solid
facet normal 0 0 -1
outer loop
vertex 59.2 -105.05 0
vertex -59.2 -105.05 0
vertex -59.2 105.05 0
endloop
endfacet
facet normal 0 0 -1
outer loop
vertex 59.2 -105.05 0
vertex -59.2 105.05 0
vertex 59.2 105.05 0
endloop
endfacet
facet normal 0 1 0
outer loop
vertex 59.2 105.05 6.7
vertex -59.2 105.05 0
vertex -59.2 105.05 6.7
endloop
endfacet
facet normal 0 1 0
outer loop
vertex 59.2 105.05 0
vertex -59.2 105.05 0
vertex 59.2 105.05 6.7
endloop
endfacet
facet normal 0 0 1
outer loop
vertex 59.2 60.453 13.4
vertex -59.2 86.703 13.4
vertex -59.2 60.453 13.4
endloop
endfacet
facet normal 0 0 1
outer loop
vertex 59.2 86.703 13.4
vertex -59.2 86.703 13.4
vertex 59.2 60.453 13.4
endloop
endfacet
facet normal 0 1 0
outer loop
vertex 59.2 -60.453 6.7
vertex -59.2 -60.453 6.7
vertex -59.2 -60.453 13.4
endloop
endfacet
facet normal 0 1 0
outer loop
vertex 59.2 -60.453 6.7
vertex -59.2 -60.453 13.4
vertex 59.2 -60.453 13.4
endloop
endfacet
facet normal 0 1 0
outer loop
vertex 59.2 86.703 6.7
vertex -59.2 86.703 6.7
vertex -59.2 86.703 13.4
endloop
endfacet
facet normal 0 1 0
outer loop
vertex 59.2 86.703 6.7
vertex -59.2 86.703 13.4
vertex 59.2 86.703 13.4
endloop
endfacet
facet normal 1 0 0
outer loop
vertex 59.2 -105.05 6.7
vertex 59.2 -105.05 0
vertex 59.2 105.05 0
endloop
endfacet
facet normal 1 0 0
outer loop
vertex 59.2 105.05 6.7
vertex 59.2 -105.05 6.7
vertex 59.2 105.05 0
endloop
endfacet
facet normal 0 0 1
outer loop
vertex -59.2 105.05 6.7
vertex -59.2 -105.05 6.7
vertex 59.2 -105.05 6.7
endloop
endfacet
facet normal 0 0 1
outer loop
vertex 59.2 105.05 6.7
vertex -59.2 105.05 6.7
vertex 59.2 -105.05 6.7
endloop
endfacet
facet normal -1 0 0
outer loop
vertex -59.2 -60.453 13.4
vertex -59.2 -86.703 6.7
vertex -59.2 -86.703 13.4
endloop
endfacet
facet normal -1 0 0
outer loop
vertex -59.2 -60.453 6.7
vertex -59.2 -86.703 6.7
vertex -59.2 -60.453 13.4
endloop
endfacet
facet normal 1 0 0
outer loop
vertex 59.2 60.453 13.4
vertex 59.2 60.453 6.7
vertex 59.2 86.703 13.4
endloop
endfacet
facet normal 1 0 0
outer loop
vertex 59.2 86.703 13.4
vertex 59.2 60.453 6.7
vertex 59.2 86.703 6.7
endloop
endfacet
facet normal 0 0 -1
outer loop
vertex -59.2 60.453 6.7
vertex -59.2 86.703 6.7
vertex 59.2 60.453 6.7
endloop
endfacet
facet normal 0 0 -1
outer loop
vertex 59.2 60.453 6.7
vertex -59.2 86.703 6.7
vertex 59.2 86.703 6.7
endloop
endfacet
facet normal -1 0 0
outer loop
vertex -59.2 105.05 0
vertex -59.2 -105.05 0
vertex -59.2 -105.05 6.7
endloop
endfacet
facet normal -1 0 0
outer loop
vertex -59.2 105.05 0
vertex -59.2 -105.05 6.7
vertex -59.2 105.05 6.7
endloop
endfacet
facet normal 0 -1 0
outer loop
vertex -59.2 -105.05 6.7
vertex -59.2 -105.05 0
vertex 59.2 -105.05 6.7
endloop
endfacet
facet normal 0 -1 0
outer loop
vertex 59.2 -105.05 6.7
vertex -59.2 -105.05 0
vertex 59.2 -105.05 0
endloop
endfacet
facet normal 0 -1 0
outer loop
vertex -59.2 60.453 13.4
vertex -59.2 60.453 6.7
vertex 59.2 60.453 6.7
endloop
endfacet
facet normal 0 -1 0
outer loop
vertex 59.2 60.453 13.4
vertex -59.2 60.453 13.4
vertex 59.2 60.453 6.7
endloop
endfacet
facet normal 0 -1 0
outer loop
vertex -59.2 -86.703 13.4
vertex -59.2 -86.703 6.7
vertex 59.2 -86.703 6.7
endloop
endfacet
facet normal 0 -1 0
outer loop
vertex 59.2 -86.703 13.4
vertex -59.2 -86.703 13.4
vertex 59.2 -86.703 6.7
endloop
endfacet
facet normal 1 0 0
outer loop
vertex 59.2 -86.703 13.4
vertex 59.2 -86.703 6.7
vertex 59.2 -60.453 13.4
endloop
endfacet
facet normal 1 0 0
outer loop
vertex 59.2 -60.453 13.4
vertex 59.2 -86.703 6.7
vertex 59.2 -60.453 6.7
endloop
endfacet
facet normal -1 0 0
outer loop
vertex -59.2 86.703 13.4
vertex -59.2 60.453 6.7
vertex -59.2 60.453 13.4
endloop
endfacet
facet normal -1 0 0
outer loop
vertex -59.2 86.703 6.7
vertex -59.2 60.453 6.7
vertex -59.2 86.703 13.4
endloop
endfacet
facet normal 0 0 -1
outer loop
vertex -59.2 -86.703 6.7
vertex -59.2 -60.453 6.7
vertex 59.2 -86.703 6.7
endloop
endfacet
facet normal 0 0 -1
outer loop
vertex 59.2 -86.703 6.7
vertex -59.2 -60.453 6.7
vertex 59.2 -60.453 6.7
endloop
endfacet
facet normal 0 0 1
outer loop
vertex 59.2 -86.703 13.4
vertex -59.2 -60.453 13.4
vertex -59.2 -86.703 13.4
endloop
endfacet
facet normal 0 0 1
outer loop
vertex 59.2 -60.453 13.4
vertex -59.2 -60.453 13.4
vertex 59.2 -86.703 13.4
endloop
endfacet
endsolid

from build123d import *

# Parameters (mm, degrees)
F1_W     = 118.4
F1_H     = 210.1
F2_DEPTH = 6.7
F3_W     = 118.4
F3_H     = 26.25
F4_DEPTH = 6.7


with BuildPart() as f2:
    # F1 (on Top) → F2 (new body)
    with BuildSketch(Plane.XY):
        Rectangle(F1_W, F1_H)
    extrude(amount=F2_DEPTH)


with BuildPart() as f4:
    # F3 (on face) → F4 (new body)
    with BuildSketch(Plane.XY.offset(6.7)):
        with Locations((0, -73.578)):
            Rectangle(F3_W, F3_H)
    extrude(amount=F4_DEPTH)


with BuildPart() as f4b:
    # F3 (on face) → F4, piece 2 (new body)
    with BuildSketch(Plane.XY.offset(6.7)):
        with Locations((0, 73.578)):
            Rectangle(F3_W, F3_H)
    extrude(amount=F4_DEPTH)


solid = Compound([f2.part, f4.part, f4b.part])
